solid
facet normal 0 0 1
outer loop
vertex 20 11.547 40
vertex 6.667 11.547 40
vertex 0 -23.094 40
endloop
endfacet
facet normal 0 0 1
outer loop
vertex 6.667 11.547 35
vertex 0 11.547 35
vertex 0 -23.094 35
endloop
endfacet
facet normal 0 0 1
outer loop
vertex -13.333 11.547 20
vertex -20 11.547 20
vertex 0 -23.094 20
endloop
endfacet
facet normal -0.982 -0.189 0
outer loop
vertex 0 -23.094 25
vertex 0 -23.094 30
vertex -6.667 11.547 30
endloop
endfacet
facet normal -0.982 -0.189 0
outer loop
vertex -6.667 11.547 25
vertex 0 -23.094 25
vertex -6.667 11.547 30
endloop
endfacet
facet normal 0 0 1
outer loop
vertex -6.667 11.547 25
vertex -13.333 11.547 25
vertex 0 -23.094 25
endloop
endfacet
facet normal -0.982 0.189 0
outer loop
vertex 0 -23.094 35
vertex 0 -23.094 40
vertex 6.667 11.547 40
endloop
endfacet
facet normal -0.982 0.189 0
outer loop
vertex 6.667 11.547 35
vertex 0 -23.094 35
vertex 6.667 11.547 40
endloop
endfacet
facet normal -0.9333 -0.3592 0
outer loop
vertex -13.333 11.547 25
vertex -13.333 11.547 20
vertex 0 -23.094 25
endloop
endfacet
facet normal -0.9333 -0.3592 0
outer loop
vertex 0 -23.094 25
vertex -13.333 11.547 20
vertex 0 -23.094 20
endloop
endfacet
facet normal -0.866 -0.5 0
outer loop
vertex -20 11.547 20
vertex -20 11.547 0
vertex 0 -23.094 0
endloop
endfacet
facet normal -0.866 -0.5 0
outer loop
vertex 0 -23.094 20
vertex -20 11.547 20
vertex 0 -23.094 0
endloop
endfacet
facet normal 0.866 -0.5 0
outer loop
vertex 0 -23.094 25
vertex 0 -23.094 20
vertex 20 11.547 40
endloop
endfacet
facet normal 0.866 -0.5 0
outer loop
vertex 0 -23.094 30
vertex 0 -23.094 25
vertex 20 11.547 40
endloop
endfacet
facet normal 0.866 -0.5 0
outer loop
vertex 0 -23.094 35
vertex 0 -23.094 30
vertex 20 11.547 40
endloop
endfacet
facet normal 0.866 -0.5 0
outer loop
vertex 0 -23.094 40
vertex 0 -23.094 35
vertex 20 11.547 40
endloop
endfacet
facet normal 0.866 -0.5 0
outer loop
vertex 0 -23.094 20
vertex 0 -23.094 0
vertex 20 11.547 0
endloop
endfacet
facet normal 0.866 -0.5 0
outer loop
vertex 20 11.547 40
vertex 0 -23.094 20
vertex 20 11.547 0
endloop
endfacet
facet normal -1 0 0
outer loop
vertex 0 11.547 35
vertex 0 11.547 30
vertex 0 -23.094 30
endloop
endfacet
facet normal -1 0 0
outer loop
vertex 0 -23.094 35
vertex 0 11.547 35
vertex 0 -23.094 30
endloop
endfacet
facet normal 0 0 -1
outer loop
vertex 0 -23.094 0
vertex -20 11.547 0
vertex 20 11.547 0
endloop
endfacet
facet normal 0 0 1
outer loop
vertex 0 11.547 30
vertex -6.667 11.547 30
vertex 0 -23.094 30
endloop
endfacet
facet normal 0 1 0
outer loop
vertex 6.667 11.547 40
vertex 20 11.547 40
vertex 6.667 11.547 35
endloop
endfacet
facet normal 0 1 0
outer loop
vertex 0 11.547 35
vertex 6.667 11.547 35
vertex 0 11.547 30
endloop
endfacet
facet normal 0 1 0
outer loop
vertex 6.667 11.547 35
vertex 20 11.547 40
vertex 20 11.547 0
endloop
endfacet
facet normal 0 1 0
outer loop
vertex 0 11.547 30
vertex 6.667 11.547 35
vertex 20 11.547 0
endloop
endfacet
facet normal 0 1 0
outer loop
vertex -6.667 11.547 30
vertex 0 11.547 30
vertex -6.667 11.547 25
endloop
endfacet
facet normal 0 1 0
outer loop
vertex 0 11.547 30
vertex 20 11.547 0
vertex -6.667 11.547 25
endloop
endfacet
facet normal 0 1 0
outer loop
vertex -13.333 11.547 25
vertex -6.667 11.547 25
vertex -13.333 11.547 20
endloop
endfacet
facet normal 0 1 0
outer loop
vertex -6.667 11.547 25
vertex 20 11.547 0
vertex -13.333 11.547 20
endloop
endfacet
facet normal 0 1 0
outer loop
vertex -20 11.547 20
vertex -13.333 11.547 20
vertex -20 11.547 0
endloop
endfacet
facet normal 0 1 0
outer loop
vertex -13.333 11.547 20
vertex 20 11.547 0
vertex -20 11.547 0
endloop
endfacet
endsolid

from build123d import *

# Parameters (mm, degrees)
F1_DEPTH  = 40
F4_DEPTH  = 10
F6_DEPTH  = 20
F8_DEPTH  = 5
F10_DEPTH = 5


with BuildPart() as f1:
    # F0 (on Top) → F1 (new body)
    with BuildSketch(Plane.XY):
        Polygon((20, 11.547005), (-20, 11.547005), (0, -23.094011), align=None)
    extrude(amount=F1_DEPTH)

    # F3 (on face) → F4 (cut)
    with BuildSketch(Plane.XY.offset(40)):
        Polygon((0, -23.094011), (6.666667, 11.547005), (-20, 11.547005), align=None)
    extrude(amount=-F4_DEPTH, mode=Mode.SUBTRACT)

    # F5 (on face) → F6 (cut)
    with BuildSketch(Plane.XY.offset(40)):
        Polygon((0, -23.094011), (-6.666667, 11.547005), (-20, 11.547005), align=None)
    extrude(amount=-F6_DEPTH, mode=Mode.SUBTRACT)

    # F7 (on face) → F8 (join)
    with BuildSketch(Plane.XY.offset(30)):
        Polygon((0, 11.547005), (0, -23.094011), (6.666667, 11.547005), align=None)
    extrude(amount=F8_DEPTH)

    # F9 (on face) → F10 (join)
    with BuildSketch(Plane.XY.offset(20)):
        Polygon((-6.666667, 11.547005), (-13.333333, 11.547005), (0, -23.094011), align=None)
    extrude(amount=F10_DEPTH)


solid = f1.part
